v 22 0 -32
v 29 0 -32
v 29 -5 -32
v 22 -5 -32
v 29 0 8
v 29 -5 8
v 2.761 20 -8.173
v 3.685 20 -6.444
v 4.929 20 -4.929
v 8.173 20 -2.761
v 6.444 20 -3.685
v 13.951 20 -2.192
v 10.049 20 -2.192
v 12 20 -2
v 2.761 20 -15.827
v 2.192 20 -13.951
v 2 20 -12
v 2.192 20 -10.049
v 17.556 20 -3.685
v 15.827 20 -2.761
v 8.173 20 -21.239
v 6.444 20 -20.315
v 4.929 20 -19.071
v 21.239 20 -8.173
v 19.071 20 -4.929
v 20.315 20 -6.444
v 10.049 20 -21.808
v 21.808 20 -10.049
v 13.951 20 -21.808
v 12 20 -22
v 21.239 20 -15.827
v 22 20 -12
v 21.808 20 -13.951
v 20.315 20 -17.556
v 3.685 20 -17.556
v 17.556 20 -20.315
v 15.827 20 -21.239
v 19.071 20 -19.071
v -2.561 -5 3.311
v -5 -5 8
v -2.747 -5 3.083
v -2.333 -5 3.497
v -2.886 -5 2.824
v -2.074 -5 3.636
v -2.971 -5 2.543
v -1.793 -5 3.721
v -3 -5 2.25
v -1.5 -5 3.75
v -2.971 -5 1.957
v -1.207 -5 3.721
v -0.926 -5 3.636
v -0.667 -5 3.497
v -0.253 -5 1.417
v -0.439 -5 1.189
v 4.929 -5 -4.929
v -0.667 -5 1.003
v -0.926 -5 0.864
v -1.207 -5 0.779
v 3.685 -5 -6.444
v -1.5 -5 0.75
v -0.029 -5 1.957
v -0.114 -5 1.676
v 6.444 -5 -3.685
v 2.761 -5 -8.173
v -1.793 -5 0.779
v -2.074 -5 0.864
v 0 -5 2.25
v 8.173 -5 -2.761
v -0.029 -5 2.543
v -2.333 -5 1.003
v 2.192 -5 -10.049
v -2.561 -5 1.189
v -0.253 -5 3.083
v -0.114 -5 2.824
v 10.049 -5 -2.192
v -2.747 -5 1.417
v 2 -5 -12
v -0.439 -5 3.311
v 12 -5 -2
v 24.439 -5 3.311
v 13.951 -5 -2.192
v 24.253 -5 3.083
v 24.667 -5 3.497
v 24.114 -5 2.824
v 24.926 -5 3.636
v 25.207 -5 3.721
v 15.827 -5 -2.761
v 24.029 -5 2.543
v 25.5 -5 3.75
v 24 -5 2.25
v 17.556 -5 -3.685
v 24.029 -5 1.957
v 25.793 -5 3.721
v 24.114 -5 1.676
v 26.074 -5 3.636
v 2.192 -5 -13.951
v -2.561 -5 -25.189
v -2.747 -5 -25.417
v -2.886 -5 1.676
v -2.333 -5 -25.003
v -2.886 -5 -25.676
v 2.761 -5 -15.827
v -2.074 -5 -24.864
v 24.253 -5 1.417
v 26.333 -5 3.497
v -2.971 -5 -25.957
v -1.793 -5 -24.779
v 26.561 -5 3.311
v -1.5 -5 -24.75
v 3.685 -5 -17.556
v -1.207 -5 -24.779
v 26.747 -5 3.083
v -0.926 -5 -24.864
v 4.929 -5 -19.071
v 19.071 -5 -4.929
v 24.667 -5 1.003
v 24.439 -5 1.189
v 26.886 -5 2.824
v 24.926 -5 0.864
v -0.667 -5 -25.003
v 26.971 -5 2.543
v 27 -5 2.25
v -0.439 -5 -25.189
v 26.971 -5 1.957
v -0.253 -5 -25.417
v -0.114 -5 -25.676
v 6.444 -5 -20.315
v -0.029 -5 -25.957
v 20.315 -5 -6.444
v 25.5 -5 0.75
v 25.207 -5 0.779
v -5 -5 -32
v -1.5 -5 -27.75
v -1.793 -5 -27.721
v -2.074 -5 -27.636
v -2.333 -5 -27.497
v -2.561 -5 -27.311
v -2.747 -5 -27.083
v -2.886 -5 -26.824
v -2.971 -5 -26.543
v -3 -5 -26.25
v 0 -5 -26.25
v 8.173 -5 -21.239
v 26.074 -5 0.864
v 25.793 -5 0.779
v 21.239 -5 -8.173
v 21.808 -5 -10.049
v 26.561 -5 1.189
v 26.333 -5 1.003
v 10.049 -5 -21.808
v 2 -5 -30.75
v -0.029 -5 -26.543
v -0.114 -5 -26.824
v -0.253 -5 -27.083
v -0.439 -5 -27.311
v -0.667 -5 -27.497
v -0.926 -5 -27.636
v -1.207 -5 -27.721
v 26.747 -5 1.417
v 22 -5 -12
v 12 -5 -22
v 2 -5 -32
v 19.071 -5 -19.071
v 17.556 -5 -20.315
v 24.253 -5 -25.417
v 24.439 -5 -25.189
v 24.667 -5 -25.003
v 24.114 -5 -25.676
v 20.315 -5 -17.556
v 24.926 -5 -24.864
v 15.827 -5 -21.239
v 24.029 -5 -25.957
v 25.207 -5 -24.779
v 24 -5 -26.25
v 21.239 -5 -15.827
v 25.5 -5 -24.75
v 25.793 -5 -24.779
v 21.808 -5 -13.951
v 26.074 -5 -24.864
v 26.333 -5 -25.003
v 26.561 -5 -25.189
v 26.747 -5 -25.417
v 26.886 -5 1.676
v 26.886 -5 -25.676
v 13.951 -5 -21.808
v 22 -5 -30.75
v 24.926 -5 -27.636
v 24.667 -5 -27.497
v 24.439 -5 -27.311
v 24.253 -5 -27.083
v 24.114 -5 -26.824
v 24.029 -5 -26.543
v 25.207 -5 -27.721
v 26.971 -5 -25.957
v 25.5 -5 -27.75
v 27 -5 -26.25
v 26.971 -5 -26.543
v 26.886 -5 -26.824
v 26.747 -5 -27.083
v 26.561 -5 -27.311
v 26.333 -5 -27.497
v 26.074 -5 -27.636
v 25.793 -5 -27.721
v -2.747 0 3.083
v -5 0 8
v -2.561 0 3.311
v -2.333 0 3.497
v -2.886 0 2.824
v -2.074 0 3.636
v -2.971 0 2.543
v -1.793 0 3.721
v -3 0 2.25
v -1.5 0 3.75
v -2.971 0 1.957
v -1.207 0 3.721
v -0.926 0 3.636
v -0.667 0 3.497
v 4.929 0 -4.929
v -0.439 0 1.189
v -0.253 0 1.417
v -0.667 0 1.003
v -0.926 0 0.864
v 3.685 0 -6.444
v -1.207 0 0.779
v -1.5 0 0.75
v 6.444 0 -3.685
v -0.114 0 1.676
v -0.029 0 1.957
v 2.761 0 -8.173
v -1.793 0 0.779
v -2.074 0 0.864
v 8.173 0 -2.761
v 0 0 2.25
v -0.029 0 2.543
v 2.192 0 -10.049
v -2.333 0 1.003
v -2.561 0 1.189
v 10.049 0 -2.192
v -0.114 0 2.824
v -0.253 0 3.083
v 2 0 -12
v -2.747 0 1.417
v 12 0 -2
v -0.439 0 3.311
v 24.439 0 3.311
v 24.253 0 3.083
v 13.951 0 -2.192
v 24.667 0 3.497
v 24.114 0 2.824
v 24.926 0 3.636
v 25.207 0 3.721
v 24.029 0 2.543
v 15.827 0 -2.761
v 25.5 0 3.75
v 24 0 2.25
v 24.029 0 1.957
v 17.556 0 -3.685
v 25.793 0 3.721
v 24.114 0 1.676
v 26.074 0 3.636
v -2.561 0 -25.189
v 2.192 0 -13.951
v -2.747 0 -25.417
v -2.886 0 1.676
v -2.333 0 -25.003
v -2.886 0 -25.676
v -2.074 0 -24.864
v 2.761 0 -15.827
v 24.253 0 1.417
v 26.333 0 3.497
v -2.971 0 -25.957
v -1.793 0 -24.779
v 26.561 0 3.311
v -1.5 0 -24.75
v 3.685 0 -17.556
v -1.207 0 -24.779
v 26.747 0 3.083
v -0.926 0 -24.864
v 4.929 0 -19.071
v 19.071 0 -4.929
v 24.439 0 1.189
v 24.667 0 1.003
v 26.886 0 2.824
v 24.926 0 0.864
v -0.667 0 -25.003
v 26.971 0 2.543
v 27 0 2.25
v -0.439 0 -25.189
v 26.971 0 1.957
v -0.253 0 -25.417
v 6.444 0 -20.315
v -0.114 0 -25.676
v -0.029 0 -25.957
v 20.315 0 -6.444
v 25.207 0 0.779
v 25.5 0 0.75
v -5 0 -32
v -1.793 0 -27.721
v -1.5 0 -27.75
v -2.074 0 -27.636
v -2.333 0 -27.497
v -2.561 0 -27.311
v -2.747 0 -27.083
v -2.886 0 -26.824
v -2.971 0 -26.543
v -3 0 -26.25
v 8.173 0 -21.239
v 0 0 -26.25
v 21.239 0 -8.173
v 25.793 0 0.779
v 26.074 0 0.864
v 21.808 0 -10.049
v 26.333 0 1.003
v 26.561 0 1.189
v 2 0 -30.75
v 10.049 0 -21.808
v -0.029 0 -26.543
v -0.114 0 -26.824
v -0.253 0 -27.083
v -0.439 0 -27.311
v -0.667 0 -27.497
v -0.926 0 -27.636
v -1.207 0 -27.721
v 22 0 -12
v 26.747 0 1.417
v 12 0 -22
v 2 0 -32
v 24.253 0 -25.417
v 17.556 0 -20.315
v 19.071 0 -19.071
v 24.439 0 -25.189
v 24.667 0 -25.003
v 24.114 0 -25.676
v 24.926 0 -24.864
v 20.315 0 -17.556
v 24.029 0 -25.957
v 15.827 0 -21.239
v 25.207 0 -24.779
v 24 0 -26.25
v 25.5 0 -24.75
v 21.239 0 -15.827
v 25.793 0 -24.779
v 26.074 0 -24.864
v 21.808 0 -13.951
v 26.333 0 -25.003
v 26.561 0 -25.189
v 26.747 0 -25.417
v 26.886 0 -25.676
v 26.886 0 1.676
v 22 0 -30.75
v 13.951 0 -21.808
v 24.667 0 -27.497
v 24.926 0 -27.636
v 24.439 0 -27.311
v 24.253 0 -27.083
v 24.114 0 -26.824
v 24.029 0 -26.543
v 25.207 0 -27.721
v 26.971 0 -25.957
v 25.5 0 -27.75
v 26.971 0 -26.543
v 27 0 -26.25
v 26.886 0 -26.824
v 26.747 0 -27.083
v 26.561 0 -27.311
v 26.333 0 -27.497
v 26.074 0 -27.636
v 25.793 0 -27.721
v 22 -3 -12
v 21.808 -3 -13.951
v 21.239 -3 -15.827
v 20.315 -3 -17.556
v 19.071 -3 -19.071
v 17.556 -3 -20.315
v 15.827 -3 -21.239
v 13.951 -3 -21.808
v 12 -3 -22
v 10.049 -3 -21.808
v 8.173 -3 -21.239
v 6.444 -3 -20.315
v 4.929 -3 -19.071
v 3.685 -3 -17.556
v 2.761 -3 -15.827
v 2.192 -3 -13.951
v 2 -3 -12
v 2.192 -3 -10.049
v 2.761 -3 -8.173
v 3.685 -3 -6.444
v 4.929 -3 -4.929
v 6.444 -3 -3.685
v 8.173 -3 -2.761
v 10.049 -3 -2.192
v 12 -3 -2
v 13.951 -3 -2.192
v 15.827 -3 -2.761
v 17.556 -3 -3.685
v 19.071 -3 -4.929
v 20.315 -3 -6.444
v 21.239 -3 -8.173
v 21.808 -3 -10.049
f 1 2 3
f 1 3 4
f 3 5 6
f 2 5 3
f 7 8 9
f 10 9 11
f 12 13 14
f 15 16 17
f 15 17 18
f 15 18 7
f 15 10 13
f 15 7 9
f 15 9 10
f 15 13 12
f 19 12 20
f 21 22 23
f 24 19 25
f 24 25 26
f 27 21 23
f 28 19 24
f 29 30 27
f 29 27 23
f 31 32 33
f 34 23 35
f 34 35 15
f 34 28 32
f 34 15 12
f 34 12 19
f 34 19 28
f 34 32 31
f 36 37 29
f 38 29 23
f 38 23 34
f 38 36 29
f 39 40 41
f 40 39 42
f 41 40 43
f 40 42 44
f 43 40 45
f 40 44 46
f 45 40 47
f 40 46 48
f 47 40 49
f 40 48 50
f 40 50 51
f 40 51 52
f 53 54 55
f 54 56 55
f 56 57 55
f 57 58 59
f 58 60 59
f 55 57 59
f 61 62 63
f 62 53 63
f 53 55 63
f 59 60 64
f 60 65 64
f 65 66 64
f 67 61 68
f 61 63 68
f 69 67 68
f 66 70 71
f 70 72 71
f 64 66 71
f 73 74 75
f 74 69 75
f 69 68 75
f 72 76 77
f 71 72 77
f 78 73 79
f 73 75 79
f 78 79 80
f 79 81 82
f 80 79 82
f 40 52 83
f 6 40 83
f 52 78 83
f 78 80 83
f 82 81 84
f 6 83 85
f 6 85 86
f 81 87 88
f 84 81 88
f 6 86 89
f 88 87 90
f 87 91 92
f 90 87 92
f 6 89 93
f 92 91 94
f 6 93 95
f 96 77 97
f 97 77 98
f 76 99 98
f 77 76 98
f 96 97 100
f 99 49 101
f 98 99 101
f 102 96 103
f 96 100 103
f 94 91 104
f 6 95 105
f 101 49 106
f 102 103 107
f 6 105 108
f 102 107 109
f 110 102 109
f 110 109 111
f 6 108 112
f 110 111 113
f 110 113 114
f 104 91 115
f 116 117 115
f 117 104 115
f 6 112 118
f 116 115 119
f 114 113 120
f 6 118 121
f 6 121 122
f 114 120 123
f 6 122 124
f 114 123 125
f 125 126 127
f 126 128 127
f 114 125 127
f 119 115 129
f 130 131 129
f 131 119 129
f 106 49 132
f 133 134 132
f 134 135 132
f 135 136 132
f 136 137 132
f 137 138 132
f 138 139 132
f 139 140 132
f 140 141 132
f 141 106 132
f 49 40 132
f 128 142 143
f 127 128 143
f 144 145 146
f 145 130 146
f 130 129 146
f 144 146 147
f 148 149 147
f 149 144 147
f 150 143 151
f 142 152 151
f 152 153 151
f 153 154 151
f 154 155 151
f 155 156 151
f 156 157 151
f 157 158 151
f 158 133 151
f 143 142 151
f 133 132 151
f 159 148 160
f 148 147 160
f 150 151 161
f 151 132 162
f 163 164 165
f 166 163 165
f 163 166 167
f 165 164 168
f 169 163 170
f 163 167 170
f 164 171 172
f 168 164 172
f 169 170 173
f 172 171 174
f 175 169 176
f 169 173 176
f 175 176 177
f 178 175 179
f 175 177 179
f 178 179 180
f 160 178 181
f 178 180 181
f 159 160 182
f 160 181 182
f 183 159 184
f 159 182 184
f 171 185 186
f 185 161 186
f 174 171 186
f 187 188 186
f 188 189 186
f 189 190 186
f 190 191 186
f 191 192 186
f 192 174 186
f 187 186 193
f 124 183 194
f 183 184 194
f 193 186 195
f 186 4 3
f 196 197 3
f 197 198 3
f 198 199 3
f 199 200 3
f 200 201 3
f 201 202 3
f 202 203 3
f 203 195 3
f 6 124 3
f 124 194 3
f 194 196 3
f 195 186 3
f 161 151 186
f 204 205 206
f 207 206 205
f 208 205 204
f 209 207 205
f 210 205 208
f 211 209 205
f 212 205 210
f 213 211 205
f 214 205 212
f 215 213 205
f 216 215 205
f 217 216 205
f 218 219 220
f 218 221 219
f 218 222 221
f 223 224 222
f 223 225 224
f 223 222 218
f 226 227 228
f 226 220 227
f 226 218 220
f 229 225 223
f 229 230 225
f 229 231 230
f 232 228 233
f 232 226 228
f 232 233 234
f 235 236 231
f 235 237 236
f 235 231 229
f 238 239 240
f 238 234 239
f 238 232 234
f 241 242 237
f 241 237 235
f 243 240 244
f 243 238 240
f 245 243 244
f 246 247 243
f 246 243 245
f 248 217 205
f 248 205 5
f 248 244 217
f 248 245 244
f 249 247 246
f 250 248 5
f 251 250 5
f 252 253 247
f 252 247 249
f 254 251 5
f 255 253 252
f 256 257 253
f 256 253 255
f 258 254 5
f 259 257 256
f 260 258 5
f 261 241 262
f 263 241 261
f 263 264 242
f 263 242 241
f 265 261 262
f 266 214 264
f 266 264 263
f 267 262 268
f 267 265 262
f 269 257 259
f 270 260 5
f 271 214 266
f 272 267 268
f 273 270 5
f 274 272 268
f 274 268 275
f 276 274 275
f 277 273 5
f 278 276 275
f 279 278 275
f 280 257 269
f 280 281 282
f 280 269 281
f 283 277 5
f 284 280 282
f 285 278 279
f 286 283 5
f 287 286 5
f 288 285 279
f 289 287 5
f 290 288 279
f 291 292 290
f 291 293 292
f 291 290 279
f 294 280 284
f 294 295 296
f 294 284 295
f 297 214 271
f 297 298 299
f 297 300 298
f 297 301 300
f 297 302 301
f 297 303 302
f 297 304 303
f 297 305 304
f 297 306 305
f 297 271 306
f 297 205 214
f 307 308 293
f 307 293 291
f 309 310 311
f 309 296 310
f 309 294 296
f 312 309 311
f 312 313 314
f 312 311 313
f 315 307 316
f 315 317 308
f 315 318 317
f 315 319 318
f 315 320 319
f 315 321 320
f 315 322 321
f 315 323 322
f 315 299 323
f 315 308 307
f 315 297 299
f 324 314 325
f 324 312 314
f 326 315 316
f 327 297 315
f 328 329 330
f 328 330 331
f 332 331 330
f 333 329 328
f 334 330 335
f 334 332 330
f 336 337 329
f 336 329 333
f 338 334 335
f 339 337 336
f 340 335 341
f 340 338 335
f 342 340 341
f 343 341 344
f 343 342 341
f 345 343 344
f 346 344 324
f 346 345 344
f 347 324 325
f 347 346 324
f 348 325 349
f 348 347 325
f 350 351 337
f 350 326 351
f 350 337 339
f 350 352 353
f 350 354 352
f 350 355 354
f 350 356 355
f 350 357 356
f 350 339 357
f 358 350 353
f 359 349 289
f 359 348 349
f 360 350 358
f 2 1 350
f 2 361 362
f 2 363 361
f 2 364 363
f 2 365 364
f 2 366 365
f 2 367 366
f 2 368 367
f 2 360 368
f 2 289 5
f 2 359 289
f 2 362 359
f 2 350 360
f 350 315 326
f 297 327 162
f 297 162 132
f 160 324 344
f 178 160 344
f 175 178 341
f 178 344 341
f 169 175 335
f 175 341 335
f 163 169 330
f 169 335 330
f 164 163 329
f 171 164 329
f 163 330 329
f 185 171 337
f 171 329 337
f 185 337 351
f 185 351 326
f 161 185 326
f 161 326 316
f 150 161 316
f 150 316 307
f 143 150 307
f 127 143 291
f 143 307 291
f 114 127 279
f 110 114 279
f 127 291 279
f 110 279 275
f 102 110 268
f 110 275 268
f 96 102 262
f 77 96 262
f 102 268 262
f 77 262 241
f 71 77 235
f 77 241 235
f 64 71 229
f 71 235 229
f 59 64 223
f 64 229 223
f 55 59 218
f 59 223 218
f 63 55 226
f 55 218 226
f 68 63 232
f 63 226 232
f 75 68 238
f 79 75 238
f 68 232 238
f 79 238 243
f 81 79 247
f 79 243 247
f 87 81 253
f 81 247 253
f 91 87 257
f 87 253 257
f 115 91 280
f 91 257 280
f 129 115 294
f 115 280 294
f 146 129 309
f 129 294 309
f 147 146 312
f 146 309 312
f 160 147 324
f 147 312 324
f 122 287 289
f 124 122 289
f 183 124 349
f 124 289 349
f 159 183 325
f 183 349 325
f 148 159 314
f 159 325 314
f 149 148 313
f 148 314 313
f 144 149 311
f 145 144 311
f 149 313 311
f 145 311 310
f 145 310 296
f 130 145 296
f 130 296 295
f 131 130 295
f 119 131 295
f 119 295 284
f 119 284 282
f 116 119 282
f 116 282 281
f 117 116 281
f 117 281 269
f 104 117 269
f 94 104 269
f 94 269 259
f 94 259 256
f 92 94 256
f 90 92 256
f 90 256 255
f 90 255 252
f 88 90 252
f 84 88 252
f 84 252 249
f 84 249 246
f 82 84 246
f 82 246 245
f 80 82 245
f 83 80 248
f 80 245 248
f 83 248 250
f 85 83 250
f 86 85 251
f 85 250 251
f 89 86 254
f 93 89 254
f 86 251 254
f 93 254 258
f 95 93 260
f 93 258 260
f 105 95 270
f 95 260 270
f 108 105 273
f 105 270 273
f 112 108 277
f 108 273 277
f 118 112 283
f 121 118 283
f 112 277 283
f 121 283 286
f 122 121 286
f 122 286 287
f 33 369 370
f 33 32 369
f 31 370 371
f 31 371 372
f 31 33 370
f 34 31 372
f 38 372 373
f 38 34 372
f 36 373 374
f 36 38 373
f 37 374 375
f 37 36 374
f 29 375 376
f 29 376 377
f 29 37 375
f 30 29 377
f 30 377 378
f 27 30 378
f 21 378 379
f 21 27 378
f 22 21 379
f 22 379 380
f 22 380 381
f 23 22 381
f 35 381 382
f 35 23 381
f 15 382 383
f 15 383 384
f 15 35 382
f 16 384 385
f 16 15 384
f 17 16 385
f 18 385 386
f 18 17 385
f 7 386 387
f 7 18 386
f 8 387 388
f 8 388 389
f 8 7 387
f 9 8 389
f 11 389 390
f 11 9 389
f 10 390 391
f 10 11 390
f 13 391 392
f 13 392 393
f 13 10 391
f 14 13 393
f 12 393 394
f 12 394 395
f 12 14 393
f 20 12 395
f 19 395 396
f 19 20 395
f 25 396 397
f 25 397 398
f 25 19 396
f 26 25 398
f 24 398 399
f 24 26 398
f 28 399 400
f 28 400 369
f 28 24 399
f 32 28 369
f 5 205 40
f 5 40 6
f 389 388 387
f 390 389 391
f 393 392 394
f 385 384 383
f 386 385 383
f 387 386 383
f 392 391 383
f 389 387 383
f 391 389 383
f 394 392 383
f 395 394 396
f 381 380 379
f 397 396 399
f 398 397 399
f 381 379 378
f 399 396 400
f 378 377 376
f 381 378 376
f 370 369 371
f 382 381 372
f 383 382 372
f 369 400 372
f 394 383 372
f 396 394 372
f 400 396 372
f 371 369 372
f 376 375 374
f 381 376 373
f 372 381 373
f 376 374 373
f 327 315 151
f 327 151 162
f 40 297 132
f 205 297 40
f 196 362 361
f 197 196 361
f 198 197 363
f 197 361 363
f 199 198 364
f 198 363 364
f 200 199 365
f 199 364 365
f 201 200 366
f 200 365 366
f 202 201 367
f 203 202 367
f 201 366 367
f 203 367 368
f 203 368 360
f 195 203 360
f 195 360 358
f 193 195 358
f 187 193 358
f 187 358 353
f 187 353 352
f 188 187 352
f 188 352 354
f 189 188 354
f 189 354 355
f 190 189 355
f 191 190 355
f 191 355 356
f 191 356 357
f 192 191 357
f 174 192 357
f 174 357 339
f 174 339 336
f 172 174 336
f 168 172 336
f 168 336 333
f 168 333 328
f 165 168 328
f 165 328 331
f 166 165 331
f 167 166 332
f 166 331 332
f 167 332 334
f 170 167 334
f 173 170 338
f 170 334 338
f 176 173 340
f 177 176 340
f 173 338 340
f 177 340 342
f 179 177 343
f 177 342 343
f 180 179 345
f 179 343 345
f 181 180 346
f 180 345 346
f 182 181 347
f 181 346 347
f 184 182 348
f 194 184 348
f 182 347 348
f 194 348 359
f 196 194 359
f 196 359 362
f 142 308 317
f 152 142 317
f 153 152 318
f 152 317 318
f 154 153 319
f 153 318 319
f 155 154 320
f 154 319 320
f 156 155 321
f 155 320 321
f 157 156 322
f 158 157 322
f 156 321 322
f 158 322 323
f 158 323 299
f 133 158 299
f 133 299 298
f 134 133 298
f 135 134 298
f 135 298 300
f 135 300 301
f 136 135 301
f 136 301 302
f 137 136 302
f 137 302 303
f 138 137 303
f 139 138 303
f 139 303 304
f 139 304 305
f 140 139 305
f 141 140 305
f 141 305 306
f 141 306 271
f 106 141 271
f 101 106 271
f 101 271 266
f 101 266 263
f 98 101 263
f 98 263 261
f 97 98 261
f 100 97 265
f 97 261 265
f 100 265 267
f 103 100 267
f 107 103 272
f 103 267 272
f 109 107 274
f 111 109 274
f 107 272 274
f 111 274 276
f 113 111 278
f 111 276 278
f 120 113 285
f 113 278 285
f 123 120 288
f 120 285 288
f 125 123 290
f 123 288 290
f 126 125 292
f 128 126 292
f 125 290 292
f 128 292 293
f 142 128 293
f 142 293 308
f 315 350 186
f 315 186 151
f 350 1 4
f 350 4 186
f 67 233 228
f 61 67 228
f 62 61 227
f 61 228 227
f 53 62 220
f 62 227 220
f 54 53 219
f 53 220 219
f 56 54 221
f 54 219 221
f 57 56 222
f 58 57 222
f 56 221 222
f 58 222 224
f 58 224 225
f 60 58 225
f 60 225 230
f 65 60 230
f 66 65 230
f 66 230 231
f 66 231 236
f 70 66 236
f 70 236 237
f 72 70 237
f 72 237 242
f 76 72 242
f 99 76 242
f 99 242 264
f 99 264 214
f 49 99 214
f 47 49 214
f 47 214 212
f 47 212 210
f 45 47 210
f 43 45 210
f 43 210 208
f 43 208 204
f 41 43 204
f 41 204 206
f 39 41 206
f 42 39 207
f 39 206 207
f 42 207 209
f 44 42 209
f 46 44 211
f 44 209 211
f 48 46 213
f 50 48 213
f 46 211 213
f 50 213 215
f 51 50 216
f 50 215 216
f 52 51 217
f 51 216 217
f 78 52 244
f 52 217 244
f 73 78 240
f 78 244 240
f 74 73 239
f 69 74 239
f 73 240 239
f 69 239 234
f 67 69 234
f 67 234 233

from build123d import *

# Parameters (mm, degrees)
SKETCH_1_R          = 10
EXTRUDE_1_DEPTH     = 20
EXTRUDE_START       = -5
SKETCH_4_R          = 10
EXTRUDE_3_DEPTH     = 5
EXTRUDE_START_2     = -3
SKETCH_4_4_R        = 10
EXTRUDE_4_DEPTH     = 3
SKETCH_5_R          = 1.5
CUT_EXTRUDE_1_DEPTH = 10


with BuildPart() as part:
    # 草图1 → 凸台-拉伸1 (new body)
    with BuildSketch(Plane(origin=(0, 0, 0), x_dir=(1, 0, 0), z_dir=(0, 1, 0))):
        with Locations((12, 12)):
            Circle(SKETCH_1_R)
    extrude(amount=EXTRUDE_1_DEPTH)

    # 草图4<4> → 凸台-拉伸4 (add)
    with BuildSketch(Plane(origin=(0, 0, 0), x_dir=(1, 0, 0), z_dir=(0, 1, 0)).offset(EXTRUDE_START_2)):
        with Locations((12, 12)):
            Circle(SKETCH_4_4_R)
    extrude(amount=EXTRUDE_4_DEPTH)


with BuildPart() as body_2:
    # 草图4 → 凸台-拉伸3 (new body)
    with BuildSketch(Plane(origin=(0, 0, 0), x_dir=(1, 0, 0), z_dir=(0, 1, 0)).offset(EXTRUDE_START)):
        Polygon((29, 32), (22, 32), (22, 30.75), (2, 30.75), (2, 32), (-5, 32), (-5, -8), (29, -8), align=None)
        with Locations((12, 12)):
            Circle(SKETCH_4_R, mode=Mode.SUBTRACT)
    extrude(amount=EXTRUDE_3_DEPTH)

    # 草图5 → 切除-拉伸1 (cut)
    with BuildSketch(Plane(origin=(0, 0, 0), x_dir=(1, 0, 0), z_dir=(0, 1, 0))):
        with Locations((-1.5, 26.25)):
            Circle(SKETCH_5_R)
        with Locations((-1.5, -2.25)):
            Circle(SKETCH_5_R)
        with Locations((25.5, -2.25)):
            Circle(SKETCH_5_R)
        with Locations((25.5, 26.25)):
            Circle(SKETCH_5_R)
    extrude(amount=-CUT_EXTRUDE_1_DEPTH, mode=Mode.SUBTRACT)


solid = Compound([part.part, body_2.part])
